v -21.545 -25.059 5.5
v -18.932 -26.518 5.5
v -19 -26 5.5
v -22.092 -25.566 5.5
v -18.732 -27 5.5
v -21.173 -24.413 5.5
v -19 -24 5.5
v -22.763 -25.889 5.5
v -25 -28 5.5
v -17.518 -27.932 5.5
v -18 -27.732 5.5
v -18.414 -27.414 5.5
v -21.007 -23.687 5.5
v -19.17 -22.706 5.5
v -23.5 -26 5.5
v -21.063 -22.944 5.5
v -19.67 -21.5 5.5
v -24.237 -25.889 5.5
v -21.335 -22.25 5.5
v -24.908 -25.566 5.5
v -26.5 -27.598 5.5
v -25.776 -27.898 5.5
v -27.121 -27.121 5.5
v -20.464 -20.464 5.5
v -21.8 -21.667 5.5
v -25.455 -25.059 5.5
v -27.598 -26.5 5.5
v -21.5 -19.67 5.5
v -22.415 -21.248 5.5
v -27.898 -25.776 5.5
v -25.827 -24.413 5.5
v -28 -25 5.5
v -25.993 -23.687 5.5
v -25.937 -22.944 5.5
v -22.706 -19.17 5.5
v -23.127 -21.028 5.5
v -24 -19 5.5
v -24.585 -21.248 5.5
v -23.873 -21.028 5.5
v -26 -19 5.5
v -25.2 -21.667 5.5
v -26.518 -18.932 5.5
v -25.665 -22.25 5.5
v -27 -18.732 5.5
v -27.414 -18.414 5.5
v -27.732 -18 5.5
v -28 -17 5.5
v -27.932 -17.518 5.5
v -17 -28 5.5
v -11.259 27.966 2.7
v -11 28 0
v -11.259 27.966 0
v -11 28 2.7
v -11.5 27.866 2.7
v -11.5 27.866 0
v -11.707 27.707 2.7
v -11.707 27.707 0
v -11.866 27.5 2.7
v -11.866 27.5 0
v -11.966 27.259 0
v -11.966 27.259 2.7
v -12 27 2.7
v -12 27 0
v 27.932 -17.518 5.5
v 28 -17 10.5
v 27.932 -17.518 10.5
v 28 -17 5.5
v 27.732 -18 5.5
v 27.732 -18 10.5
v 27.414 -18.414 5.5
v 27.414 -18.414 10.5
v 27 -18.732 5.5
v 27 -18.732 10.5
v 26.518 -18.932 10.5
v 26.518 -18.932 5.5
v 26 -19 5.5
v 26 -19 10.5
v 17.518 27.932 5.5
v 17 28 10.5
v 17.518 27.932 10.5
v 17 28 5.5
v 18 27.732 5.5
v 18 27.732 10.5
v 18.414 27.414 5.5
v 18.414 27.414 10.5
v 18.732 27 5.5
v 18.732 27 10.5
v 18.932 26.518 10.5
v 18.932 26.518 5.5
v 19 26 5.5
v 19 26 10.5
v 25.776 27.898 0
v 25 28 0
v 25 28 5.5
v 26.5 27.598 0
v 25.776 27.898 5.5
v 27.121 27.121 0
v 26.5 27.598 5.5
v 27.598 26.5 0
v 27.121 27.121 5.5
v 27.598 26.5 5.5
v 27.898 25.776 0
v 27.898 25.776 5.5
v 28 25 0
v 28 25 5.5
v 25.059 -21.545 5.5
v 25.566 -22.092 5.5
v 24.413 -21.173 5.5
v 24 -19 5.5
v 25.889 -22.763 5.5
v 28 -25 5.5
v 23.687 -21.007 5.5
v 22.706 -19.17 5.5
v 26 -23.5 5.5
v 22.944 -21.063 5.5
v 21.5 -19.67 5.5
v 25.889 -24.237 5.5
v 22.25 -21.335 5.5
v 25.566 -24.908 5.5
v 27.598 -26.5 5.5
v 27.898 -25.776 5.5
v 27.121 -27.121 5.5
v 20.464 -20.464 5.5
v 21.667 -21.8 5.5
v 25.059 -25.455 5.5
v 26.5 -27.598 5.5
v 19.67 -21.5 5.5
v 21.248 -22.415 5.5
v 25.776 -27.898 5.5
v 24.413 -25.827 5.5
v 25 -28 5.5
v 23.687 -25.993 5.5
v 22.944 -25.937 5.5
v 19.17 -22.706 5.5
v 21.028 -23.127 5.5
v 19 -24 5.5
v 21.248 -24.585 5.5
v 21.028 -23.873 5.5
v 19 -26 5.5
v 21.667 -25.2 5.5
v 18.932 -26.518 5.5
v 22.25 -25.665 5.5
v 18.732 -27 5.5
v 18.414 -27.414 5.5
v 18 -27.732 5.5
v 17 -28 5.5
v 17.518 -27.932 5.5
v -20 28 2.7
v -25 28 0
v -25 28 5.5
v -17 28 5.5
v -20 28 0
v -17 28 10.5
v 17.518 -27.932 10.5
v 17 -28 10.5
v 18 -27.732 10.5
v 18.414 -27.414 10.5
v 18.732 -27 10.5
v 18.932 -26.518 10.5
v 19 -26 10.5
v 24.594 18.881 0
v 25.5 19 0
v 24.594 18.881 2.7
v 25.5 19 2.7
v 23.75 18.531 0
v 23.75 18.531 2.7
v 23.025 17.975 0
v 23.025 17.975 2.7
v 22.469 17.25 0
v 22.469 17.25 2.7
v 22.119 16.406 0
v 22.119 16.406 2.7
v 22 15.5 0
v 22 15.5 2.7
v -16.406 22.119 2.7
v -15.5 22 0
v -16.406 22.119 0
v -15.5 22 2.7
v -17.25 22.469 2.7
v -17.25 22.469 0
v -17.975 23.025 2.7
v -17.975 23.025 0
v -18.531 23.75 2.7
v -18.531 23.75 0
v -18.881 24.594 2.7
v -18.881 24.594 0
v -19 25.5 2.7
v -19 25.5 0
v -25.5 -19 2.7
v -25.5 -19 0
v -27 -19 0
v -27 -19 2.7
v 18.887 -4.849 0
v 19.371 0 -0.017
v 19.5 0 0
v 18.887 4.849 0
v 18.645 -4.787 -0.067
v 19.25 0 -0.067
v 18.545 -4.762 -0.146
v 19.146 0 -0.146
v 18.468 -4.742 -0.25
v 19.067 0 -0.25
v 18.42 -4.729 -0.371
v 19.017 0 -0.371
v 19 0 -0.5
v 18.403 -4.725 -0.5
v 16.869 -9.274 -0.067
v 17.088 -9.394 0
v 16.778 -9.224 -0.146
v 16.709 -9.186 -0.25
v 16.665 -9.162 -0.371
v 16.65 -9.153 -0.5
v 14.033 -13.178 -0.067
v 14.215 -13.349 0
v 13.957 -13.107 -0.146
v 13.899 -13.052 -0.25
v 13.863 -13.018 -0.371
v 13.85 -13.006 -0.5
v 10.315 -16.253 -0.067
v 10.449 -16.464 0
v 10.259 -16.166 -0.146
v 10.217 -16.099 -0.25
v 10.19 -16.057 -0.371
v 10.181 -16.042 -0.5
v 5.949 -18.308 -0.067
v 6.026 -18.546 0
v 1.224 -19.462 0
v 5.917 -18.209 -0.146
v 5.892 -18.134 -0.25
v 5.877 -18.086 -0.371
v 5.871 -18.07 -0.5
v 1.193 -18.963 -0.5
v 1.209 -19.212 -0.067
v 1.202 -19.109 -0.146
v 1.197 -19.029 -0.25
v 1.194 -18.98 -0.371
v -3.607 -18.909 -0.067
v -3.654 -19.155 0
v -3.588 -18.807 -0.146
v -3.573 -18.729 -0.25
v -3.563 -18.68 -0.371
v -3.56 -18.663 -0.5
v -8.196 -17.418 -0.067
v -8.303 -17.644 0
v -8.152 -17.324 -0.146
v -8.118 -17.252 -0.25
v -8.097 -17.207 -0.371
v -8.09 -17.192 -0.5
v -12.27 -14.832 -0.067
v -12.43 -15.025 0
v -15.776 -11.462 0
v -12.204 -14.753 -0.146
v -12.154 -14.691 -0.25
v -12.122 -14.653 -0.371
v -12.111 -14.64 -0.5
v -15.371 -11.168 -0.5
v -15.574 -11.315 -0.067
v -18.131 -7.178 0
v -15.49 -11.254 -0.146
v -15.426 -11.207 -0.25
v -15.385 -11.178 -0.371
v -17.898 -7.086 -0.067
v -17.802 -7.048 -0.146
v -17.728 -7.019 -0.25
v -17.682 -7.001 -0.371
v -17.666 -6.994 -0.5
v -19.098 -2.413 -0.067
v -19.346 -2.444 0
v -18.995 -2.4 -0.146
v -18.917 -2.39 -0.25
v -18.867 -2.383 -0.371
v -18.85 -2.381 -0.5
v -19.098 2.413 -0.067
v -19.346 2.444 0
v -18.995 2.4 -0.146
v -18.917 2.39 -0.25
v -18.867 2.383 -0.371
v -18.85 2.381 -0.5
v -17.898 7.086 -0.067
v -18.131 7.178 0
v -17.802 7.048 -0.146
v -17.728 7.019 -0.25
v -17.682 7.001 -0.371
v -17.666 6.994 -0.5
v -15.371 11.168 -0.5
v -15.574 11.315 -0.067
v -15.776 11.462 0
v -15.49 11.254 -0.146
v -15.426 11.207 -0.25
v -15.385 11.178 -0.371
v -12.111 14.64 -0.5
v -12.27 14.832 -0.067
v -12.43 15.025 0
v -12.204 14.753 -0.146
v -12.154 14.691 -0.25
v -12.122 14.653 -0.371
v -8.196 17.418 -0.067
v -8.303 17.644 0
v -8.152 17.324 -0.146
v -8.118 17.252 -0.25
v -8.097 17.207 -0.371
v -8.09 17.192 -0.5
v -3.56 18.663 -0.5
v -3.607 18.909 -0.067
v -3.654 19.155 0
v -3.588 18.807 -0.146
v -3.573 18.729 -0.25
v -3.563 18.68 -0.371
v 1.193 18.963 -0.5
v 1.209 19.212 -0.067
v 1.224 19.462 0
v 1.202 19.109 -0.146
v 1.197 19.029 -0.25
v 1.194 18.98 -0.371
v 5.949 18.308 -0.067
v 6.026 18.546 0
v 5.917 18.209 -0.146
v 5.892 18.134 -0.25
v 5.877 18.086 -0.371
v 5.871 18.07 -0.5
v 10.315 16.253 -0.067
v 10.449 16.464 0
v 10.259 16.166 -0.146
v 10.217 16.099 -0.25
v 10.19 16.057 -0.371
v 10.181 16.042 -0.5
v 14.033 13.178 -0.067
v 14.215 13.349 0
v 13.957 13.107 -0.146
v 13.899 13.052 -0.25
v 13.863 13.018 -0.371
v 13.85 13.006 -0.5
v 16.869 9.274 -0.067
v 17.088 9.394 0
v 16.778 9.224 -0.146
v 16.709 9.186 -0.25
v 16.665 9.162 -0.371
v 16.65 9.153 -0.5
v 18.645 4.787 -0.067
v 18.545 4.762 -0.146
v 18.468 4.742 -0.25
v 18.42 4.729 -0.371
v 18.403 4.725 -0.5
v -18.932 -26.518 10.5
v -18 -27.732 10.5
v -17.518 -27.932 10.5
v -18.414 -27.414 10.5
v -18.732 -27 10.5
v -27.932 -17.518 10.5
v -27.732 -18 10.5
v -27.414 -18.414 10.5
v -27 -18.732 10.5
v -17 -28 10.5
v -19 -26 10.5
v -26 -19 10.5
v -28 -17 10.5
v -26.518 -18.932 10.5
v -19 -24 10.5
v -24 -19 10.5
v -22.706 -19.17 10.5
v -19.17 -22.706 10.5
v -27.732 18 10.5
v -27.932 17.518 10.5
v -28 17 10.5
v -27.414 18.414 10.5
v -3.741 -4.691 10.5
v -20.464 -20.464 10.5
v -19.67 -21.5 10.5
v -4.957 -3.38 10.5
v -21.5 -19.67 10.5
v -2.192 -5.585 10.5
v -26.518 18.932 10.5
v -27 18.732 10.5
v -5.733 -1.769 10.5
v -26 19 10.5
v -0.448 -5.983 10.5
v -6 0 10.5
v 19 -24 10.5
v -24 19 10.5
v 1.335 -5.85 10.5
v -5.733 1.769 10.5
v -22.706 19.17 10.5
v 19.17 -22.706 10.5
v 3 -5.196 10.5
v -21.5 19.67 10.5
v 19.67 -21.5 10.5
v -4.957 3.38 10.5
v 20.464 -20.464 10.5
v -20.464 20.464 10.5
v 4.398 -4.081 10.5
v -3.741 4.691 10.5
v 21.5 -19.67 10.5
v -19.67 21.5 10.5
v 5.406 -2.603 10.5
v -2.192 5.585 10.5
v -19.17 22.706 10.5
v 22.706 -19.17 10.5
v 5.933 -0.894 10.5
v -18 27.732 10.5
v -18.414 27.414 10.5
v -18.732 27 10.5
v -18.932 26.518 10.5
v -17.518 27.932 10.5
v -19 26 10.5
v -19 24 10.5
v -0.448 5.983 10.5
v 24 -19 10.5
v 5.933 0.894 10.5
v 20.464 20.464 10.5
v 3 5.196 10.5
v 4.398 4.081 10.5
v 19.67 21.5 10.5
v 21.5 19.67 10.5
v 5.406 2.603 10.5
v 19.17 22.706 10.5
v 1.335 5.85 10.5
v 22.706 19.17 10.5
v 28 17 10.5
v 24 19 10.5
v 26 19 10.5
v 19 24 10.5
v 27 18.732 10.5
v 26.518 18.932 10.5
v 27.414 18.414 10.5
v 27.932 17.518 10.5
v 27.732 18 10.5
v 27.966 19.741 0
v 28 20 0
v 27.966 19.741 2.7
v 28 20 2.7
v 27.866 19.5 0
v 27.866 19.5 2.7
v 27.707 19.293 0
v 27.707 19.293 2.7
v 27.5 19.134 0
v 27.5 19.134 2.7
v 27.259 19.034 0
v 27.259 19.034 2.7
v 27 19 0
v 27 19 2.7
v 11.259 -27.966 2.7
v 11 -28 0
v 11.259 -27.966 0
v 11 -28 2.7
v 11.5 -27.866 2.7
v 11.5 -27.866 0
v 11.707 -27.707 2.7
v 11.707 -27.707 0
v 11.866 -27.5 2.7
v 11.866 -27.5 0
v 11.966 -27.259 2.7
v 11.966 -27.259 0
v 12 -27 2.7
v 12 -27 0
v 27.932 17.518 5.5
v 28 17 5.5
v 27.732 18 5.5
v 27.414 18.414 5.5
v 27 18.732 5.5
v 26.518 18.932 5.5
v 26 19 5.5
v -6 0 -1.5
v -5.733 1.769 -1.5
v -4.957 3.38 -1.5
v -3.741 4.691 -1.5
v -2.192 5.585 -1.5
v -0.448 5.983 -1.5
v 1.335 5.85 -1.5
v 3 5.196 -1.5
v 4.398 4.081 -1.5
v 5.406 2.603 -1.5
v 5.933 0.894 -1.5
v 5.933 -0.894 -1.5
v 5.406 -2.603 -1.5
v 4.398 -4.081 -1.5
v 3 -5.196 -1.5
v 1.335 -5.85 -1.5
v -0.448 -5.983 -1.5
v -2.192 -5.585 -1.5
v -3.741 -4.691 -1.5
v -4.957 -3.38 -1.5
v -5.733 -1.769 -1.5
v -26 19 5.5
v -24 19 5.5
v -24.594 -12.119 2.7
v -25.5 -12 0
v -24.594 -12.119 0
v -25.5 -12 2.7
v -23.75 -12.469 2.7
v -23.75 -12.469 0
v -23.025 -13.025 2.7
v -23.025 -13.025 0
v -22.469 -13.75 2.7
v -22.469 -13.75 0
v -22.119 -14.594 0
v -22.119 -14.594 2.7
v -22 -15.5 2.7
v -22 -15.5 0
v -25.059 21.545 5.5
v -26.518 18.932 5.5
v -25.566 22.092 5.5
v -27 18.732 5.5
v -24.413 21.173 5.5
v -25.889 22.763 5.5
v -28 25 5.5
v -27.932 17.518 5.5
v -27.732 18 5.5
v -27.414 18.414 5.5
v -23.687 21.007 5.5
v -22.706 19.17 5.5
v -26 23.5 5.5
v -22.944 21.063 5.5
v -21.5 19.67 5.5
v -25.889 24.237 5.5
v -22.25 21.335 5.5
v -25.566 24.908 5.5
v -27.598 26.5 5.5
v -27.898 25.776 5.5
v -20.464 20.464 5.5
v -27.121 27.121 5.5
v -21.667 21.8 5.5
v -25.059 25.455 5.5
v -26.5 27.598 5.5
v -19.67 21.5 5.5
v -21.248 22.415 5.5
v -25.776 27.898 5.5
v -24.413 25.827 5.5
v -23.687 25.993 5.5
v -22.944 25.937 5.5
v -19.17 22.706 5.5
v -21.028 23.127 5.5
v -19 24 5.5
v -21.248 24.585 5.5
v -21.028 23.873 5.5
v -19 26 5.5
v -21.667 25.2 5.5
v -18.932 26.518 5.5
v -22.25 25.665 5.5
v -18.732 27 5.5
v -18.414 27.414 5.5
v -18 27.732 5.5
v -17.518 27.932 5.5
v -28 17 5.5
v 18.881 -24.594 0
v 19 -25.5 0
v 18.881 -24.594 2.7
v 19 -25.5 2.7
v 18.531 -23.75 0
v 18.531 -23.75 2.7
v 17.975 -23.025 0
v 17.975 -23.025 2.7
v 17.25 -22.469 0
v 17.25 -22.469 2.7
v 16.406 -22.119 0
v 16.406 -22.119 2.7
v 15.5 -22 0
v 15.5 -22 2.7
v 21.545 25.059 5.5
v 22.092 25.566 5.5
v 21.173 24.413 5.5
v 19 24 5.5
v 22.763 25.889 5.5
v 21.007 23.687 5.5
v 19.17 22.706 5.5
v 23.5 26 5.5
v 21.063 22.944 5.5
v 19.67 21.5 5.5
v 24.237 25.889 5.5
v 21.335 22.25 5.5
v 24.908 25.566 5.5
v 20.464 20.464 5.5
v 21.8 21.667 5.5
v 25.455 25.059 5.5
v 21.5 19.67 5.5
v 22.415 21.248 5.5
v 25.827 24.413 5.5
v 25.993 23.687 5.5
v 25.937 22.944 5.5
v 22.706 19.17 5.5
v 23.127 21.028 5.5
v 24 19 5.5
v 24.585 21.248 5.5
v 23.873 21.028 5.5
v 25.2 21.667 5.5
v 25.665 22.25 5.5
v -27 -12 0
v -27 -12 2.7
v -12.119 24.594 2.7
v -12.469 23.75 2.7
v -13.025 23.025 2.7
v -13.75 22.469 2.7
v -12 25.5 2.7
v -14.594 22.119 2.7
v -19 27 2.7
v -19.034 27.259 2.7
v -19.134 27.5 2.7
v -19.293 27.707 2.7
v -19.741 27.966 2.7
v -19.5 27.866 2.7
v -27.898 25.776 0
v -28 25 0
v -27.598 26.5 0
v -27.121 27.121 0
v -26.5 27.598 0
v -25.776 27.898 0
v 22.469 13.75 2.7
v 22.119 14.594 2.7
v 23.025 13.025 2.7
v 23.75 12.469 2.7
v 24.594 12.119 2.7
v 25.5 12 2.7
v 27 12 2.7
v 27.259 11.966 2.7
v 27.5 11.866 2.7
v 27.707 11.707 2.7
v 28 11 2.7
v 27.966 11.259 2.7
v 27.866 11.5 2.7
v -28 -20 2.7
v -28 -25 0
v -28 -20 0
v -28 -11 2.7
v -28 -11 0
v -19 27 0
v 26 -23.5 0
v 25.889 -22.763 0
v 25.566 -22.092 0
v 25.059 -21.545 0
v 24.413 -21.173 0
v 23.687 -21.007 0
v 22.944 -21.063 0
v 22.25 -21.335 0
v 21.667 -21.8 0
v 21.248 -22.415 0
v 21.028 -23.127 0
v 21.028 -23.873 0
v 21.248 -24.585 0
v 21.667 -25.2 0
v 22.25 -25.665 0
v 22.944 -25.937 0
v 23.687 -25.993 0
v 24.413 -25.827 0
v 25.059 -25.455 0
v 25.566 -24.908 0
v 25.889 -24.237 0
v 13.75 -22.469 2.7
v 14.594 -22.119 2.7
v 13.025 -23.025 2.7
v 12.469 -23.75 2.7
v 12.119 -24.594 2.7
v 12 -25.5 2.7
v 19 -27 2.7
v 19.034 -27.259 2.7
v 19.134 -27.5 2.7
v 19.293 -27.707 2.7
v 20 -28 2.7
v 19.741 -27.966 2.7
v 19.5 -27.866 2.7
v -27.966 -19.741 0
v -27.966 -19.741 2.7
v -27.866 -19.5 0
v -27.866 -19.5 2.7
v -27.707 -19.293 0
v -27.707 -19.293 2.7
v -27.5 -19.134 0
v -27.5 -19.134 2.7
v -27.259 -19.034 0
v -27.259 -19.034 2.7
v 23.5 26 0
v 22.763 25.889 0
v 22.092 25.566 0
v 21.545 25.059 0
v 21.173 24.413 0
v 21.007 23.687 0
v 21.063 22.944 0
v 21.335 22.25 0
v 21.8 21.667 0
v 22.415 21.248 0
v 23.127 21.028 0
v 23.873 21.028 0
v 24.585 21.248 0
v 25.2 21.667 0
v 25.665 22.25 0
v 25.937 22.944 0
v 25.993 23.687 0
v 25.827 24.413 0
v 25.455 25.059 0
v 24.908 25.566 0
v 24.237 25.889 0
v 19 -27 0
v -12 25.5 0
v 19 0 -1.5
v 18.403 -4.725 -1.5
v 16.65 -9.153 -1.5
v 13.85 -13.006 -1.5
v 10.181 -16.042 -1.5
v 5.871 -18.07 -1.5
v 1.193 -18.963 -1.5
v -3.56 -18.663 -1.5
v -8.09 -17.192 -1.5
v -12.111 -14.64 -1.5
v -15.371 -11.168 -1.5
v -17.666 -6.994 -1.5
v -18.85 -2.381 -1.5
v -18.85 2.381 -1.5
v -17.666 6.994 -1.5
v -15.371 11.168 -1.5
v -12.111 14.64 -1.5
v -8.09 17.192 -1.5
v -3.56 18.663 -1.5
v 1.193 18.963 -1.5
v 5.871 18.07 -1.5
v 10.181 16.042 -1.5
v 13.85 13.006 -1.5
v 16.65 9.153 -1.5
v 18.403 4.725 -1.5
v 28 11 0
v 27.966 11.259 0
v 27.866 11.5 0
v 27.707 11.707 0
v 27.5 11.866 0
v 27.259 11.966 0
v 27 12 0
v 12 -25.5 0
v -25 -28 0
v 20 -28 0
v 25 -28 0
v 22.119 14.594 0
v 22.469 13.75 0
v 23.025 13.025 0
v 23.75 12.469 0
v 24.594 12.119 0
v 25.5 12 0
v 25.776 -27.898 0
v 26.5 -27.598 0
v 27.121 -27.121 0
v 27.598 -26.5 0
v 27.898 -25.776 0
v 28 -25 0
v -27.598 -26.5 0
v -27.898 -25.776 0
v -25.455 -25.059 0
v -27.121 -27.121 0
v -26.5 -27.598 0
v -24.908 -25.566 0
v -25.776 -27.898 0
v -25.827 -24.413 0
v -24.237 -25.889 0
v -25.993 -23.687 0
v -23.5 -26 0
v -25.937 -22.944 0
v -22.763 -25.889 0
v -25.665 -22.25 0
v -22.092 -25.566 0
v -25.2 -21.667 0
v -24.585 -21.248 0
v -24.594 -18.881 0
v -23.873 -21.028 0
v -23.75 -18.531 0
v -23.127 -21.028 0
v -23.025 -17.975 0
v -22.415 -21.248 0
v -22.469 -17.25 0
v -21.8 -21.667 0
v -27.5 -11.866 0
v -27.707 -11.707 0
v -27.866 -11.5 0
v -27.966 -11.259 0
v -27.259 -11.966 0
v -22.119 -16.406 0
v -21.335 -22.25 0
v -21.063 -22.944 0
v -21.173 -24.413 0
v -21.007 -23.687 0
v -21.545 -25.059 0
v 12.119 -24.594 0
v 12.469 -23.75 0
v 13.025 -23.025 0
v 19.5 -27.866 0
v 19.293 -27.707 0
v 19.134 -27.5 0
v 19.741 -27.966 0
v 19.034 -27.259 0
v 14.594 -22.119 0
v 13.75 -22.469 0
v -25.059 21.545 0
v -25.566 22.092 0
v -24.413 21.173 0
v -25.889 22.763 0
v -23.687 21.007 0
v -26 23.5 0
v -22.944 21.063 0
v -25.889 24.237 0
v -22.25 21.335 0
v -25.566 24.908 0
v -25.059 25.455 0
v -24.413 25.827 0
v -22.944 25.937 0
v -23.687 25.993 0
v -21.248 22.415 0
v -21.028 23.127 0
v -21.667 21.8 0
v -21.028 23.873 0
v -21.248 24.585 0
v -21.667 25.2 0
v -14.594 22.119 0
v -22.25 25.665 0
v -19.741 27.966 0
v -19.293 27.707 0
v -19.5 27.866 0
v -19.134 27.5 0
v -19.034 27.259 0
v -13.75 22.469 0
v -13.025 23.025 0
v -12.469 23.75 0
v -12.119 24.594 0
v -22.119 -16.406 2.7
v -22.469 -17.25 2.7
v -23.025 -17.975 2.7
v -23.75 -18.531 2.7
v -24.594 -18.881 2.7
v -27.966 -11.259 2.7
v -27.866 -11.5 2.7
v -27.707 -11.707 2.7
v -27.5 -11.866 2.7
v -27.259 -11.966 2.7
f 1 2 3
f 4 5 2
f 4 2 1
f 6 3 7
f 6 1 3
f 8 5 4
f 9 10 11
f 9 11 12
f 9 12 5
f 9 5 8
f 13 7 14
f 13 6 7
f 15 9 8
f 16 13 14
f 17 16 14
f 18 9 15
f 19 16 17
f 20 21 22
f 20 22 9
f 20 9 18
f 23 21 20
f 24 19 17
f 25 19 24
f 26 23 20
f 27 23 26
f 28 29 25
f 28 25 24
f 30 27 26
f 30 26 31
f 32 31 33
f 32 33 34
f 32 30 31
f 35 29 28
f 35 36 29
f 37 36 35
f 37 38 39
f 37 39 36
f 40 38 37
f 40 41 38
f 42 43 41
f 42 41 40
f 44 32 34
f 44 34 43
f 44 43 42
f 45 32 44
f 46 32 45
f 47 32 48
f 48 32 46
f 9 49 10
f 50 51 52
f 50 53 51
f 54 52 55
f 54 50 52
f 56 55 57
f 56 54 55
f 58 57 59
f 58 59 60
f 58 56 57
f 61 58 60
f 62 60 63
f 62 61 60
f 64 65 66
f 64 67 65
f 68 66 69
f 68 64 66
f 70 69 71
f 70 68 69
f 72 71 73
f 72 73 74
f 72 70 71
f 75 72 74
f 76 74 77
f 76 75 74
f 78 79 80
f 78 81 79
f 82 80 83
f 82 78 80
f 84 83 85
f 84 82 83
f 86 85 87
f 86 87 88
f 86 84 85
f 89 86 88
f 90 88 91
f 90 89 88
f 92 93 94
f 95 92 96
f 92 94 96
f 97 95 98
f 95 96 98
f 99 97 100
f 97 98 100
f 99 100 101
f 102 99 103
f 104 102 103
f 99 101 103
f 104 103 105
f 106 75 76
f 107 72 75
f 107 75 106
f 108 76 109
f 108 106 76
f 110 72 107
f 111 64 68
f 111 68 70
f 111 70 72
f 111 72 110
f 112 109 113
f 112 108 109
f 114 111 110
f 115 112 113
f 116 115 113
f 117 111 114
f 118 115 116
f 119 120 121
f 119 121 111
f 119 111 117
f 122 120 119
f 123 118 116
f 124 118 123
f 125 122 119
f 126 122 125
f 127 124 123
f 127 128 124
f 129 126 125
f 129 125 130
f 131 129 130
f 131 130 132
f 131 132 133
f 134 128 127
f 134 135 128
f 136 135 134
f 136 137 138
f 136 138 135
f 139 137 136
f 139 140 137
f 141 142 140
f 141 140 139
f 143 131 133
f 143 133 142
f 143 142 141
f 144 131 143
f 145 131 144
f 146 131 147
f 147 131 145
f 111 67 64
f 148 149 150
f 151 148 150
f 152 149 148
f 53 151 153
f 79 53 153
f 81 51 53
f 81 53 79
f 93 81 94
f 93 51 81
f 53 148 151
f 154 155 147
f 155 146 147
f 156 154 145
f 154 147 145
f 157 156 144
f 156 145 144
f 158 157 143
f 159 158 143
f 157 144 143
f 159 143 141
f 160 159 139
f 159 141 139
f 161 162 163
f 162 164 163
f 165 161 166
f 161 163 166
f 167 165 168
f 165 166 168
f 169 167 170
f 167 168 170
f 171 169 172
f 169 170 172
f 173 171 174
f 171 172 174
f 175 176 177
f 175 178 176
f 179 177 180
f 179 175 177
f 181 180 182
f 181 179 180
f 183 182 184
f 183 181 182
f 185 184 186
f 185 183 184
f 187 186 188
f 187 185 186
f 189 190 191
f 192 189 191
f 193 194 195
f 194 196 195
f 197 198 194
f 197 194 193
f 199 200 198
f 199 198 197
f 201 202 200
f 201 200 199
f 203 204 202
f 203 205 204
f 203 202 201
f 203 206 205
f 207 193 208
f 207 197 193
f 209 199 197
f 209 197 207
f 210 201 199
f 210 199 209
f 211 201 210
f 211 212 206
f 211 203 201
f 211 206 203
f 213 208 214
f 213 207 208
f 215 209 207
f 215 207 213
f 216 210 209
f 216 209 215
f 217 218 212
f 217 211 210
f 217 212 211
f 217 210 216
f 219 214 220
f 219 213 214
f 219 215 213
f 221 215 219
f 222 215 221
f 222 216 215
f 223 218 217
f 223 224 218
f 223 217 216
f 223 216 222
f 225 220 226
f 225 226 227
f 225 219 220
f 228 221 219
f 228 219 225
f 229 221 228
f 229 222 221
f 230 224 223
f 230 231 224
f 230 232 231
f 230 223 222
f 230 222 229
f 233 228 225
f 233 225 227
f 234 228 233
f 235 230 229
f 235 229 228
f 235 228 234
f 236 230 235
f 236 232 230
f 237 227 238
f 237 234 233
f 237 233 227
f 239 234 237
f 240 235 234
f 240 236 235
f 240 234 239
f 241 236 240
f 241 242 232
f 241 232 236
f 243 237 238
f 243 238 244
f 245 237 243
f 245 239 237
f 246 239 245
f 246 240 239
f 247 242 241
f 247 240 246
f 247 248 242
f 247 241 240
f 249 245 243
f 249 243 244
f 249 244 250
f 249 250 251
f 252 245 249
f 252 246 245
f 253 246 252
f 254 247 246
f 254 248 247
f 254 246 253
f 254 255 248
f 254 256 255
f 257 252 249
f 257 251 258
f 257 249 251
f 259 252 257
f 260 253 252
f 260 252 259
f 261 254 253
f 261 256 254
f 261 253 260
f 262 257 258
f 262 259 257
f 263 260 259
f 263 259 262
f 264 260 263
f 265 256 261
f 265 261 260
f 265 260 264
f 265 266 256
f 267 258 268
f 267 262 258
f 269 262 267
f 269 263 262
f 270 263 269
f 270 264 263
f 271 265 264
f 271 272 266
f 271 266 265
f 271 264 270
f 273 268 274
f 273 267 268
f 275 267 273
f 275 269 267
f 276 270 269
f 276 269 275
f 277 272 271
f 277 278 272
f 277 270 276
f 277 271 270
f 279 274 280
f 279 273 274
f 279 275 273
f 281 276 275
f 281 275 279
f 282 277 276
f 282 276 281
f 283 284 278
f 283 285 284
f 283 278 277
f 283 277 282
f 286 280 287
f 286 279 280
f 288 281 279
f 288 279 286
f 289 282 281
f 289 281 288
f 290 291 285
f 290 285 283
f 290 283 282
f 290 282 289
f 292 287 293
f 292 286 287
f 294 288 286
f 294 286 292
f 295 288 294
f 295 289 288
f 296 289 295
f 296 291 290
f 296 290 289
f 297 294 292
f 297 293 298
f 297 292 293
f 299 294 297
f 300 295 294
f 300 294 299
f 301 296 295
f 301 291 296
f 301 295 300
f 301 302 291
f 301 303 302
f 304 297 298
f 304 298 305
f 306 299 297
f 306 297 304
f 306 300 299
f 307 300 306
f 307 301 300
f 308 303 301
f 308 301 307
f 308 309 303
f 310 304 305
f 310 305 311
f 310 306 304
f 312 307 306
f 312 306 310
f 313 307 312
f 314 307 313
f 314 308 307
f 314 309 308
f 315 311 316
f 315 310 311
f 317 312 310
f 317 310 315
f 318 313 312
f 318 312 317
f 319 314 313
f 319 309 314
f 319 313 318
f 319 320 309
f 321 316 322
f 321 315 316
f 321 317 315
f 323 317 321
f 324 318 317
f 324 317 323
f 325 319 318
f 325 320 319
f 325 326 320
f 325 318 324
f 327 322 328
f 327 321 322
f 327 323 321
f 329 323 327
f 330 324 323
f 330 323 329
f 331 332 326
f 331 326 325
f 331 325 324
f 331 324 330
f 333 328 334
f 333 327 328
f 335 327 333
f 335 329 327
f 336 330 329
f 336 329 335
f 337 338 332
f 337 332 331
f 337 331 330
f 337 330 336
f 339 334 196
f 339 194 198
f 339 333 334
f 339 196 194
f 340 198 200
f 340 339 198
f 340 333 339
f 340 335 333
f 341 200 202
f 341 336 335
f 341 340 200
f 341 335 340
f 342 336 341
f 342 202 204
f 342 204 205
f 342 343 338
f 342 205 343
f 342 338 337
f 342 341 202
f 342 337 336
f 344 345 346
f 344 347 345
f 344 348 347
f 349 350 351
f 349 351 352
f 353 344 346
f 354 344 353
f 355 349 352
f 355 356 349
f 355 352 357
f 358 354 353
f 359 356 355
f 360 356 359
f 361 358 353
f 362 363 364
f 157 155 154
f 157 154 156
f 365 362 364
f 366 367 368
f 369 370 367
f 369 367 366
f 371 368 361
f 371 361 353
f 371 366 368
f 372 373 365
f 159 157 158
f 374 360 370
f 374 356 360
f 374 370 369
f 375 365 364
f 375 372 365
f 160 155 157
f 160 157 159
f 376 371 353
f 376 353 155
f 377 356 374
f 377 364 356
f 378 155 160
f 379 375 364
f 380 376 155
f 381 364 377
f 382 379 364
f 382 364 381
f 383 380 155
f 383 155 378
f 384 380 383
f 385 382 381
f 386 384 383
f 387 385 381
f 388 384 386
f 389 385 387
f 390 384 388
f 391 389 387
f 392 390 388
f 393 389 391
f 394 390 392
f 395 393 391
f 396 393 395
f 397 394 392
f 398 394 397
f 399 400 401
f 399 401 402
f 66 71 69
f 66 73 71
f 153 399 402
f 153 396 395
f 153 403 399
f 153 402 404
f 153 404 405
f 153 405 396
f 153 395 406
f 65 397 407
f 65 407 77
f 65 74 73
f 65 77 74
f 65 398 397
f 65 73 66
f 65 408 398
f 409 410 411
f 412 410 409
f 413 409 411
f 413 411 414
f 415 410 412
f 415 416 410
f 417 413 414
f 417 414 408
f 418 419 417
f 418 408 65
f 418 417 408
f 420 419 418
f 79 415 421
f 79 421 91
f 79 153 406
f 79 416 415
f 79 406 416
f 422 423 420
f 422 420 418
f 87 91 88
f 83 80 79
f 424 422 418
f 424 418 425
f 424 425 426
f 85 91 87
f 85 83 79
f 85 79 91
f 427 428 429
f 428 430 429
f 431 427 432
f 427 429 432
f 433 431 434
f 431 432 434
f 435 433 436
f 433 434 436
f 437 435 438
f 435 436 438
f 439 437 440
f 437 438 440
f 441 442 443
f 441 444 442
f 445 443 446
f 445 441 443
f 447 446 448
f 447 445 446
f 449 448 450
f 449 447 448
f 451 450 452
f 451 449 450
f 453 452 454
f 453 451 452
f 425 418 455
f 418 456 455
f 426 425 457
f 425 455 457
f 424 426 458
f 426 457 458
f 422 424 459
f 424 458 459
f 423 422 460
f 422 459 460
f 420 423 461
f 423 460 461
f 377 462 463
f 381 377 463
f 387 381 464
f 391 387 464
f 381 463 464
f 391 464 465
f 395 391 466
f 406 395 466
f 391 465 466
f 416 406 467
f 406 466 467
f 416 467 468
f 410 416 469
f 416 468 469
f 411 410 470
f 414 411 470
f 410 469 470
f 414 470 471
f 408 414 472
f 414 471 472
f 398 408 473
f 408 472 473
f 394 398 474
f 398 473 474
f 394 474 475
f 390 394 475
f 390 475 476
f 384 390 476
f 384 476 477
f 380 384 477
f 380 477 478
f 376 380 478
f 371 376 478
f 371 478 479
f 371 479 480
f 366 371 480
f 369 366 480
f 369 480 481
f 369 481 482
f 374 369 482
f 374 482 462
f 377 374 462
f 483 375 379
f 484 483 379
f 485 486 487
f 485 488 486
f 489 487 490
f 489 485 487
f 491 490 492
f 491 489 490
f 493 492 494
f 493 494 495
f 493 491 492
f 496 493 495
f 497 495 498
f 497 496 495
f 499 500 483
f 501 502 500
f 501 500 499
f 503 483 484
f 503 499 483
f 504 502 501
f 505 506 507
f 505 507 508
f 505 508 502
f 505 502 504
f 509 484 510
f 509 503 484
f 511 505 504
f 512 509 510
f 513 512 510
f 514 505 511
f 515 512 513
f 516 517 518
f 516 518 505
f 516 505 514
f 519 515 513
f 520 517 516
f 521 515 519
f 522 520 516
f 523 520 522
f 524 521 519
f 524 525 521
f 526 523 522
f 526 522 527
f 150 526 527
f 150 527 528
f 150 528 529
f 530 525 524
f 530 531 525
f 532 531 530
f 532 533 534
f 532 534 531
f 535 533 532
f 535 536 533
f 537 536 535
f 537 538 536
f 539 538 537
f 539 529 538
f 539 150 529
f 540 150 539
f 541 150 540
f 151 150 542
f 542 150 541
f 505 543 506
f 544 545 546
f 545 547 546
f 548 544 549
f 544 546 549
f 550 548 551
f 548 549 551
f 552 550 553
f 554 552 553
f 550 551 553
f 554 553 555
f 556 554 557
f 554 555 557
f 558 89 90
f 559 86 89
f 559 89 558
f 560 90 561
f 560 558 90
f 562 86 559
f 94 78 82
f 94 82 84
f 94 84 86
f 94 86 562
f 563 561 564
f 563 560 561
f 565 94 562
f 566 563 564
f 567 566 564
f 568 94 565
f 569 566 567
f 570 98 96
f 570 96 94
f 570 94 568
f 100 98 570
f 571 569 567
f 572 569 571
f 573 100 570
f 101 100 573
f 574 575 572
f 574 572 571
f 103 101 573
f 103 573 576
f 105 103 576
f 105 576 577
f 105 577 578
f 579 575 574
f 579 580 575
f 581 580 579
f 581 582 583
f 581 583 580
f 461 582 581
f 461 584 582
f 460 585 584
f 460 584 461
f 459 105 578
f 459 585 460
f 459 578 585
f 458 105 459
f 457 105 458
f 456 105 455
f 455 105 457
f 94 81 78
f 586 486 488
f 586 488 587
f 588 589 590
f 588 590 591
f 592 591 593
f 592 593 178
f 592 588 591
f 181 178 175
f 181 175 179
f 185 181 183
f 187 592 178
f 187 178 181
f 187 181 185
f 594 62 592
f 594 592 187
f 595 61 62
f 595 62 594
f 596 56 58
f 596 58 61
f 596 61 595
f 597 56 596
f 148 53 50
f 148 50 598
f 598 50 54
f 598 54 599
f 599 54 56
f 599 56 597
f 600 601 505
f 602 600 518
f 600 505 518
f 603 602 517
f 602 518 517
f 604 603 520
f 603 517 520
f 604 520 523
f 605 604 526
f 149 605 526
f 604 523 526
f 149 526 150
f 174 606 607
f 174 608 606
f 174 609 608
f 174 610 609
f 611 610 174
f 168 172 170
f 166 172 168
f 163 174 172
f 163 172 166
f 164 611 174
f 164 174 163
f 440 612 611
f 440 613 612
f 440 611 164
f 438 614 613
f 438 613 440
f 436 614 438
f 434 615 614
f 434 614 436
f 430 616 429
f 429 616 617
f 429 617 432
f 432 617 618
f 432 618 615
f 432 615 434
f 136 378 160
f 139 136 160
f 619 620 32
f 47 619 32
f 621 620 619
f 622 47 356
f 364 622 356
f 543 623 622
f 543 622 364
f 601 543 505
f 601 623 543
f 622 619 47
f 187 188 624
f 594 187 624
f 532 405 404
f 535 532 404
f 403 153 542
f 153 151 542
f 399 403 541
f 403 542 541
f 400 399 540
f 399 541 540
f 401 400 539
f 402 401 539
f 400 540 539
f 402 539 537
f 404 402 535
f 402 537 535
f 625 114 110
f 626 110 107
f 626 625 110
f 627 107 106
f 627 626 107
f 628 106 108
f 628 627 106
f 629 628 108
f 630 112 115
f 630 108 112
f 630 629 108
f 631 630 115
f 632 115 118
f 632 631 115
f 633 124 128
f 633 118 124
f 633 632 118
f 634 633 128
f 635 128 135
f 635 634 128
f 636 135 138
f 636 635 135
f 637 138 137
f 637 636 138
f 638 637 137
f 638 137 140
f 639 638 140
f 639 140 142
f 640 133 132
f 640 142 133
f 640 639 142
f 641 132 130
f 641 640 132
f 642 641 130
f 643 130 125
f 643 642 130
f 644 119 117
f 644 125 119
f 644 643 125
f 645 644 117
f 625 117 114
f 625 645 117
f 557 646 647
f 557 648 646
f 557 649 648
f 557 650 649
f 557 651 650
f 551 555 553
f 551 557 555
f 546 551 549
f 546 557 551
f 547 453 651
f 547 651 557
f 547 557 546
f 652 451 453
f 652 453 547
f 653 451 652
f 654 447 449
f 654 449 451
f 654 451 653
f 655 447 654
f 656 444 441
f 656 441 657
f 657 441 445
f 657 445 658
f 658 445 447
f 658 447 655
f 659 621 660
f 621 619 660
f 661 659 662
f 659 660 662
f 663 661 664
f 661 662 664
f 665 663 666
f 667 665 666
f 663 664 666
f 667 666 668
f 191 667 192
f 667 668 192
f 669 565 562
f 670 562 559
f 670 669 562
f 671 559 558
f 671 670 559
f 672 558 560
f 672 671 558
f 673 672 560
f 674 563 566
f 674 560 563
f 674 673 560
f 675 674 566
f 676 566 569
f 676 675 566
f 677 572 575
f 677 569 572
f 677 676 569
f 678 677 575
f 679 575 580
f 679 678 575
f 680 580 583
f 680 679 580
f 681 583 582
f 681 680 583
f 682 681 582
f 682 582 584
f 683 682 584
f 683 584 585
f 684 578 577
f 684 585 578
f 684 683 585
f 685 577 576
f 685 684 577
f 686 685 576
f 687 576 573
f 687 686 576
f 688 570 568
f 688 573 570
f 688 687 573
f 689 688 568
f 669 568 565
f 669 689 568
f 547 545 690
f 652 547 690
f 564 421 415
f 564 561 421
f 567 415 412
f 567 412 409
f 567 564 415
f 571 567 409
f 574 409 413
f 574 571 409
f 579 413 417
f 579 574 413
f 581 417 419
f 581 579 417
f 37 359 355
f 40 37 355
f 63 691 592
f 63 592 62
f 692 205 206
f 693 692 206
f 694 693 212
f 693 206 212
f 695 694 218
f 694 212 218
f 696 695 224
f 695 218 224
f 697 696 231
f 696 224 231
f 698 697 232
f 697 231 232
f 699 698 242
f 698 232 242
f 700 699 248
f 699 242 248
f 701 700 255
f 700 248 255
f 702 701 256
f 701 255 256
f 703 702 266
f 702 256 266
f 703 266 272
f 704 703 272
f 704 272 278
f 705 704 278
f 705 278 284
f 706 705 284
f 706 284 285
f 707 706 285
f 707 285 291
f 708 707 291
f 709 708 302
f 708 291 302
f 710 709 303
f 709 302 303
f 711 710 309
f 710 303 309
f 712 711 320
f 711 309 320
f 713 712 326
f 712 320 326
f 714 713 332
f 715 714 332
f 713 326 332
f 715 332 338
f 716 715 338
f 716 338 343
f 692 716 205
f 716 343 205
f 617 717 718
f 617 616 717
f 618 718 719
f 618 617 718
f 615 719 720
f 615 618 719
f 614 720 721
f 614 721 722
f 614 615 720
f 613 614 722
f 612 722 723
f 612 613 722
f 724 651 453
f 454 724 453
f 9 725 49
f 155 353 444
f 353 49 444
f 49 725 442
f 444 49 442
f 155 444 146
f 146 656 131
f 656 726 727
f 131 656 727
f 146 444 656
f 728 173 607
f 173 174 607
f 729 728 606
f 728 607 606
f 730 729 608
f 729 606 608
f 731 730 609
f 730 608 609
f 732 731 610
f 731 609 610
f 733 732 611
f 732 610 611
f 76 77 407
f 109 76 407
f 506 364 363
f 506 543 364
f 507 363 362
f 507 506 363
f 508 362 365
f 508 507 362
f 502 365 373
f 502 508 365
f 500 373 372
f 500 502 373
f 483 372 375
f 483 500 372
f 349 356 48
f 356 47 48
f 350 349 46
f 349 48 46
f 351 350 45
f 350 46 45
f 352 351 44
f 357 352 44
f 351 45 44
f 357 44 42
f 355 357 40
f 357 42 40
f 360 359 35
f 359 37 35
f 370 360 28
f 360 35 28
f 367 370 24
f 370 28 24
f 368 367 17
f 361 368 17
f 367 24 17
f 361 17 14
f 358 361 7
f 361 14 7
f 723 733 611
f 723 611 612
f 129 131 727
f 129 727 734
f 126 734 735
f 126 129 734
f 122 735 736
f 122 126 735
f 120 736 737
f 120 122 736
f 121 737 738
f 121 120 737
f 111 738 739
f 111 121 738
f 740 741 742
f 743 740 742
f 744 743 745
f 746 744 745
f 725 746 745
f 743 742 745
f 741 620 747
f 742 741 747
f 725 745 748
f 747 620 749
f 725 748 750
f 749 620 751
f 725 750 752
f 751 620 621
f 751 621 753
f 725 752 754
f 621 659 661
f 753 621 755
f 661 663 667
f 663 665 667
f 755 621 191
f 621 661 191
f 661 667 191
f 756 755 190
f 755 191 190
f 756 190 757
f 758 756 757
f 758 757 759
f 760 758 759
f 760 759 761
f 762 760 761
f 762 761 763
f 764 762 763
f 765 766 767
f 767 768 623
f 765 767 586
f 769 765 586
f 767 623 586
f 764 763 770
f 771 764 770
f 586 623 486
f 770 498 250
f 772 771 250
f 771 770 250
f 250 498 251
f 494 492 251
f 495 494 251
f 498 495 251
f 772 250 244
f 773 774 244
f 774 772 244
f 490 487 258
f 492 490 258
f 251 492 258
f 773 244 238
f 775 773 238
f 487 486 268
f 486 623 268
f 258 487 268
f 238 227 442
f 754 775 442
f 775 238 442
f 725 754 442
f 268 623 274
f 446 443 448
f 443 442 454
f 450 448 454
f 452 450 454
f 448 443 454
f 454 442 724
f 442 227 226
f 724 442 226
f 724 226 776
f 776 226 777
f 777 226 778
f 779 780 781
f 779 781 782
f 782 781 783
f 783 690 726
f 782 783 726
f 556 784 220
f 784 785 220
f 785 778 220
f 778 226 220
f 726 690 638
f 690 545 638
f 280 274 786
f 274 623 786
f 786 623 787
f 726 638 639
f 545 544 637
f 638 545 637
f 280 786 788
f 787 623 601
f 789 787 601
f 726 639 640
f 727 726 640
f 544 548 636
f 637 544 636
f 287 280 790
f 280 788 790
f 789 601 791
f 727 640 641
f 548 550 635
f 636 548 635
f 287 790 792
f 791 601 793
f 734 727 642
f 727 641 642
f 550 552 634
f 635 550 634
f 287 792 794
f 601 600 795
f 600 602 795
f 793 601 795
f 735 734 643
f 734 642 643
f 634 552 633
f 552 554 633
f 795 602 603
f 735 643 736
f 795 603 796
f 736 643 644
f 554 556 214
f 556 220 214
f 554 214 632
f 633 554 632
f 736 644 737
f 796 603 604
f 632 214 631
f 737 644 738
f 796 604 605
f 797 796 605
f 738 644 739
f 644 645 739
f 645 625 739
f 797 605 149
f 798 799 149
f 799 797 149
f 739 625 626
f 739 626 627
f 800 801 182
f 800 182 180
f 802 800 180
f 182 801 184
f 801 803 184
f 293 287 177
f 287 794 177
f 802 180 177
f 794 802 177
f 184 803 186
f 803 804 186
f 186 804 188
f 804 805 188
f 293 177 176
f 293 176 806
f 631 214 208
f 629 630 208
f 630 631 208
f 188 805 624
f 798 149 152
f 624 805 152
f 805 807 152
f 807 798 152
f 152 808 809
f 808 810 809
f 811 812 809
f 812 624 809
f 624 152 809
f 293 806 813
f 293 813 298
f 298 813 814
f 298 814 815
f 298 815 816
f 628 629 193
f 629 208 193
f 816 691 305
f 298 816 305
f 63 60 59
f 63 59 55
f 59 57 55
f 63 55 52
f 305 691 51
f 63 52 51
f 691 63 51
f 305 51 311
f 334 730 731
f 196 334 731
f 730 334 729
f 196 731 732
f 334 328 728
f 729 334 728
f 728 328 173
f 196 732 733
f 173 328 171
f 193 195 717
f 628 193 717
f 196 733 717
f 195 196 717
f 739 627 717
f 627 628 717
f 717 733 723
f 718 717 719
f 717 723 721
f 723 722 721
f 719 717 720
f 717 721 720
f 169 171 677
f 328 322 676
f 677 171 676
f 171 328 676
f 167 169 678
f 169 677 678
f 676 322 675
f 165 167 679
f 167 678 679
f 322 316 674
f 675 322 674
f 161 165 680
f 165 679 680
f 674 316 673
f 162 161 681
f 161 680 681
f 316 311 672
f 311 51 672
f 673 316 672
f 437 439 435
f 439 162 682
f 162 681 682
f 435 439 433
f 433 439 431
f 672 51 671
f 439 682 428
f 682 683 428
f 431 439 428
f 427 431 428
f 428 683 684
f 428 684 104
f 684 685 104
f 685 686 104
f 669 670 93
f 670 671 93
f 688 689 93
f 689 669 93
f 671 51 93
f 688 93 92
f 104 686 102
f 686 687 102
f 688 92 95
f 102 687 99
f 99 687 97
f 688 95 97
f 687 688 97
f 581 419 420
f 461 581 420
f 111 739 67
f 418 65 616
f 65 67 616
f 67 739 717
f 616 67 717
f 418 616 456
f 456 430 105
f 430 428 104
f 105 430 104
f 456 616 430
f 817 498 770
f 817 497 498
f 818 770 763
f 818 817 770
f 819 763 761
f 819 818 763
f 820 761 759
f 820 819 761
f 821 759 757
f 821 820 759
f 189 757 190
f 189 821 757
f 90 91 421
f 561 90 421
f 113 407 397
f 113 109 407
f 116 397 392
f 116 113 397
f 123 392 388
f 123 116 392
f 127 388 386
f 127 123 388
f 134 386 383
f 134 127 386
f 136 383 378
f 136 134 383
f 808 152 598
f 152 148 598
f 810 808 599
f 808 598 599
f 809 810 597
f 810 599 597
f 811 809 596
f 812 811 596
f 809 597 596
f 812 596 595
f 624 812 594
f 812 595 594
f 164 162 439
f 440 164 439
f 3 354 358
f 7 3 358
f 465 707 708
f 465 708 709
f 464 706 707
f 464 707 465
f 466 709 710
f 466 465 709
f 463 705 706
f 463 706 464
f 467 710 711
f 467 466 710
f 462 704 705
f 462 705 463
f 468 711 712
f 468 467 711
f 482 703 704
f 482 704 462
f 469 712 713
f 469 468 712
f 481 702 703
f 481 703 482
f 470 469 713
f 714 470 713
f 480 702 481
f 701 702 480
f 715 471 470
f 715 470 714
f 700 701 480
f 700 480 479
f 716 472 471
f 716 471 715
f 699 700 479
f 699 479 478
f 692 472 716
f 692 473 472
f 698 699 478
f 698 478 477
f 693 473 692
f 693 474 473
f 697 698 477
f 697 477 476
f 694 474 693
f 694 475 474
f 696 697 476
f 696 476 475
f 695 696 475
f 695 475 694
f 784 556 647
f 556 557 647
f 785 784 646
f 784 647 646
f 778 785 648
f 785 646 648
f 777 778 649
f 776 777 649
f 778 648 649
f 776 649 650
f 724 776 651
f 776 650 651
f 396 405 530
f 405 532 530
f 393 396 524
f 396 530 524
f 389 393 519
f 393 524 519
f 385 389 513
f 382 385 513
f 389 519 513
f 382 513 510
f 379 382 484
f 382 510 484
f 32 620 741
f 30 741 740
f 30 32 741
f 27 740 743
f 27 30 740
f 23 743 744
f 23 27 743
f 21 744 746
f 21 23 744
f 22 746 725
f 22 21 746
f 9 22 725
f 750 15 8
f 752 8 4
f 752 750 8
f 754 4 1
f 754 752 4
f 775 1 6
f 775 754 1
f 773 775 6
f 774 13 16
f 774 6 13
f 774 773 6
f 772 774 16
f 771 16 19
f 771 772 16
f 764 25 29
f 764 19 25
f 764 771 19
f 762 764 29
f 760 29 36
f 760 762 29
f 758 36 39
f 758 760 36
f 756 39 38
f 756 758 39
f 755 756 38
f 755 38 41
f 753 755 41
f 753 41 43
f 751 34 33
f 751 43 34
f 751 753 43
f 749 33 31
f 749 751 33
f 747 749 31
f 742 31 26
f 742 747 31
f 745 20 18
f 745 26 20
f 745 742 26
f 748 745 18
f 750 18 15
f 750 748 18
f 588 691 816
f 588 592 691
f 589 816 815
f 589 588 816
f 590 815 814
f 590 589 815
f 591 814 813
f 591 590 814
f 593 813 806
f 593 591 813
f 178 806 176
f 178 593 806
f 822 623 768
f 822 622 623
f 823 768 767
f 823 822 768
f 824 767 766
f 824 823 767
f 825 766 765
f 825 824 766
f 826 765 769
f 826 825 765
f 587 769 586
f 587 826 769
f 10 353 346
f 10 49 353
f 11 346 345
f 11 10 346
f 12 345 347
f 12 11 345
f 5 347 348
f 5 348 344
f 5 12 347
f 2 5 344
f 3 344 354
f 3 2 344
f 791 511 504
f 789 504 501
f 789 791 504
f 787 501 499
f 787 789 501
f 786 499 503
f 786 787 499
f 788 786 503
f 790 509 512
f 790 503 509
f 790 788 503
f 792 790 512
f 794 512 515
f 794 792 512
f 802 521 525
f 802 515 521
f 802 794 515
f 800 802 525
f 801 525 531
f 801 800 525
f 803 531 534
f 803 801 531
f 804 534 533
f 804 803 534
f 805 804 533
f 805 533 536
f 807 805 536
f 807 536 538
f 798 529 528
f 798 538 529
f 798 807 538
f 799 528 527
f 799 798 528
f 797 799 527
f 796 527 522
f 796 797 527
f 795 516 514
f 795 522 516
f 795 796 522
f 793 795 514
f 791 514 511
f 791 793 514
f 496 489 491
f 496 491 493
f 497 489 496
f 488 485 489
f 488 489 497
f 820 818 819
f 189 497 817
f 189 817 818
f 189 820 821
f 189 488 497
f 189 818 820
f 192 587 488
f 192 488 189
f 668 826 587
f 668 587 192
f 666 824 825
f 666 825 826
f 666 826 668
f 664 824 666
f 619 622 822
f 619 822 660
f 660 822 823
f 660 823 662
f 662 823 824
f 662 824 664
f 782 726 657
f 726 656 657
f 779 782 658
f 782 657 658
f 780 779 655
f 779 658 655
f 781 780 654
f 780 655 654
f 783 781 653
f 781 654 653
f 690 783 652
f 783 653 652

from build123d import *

# Parameters (mm, degrees)
SKETCH1_W           = 56
SKETCH1_H           = 56
BOSS_EXTRUDE1_DEPTH = 10.5
SKETCH4_R           = 19
BOSS_EXTRUDE4_DEPTH = 1.5
FILLET1_R           = 0.5
FILLET2_R           = 3
SKETCH5_R           = 6
CUT_EXTRUDE1_DEPTH  = 42.376321731
SKETCH8_W           = 7
SKETCH8_H           = 6
CUT_EXTRUDE2_DEPTH  = 2.7
CIRPATTERN7_COUNT   = 4
FILLET5_R           = 1
FILLET6_R           = 3.5
SKETCH10_W          = 9
SKETCH10_H          = 9
CUT_EXTRUDE4_DEPTH  = 5
CIRPATTERN11_COUNT  = 4
FILLET8_R           = 2
FILLET9_R           = 5
CIRPATTERN12_COUNT  = 4


with BuildPart() as part:
    # Sketch1 → Boss-Extrude1 (new body)
    with BuildSketch(Plane.XY):
        Rectangle(SKETCH1_W, SKETCH1_H)
    extrude(amount=BOSS_EXTRUDE1_DEPTH)

    # Sketch4 → Boss-Extrude4 (add)
    with BuildSketch(Plane(origin=(0, 0, 0), x_dir=(-1, 0, 0), z_dir=(0, 0, -1))):
        with Locations(Location((0, 0, 0), (0, 0, 180))):
            Circle(SKETCH4_R)
    extrude(amount=BOSS_EXTRUDE4_DEPTH)

    # Fillet1
    fillet1_edges = [part.edges().sort_by_distance(p)[0] for p in [
        (-19, 0, 0),
    ]]
    fillet(fillet1_edges, radius=FILLET1_R)

    # Fillet2
    fillet2_edges = [part.edges().sort_by_distance(p)[0] for p in [
        (-28, 28, 5.25),
        (28, 28, 5.25),
        (28, -28, 5.25),
        (-28, -28, 5.25),
    ]]
    fillet(fillet2_edges, radius=FILLET2_R)

    # Sketch5 → Cut-Extrude1 (cut, through all)
    with BuildSketch(Plane(origin=(0, 0, -1.5), x_dir=(-1, 0, 0), z_dir=(0, 0, -1))):
        Circle(SKETCH5_R)
    extrude(amount=-CUT_EXTRUDE1_DEPTH, mode=Mode.SUBTRACT)

    # Sketch7 → Ø5.0mm Dowel Hole1 (revolve, cut)
    with BuildSketch(Plane(origin=(23.5, 23.5, 0), x_dir=(0, 1, 0), z_dir=(1, 0, 0))):
        Polygon((0, 0), (0, 18.502151548), (2.5, 17), (2.5, 0), align=None)
    f_5_0mm_dowel_hole1 = revolve(axis=Axis((23.5, 23.5, -6.35), (0, 0, 1)), mode=Mode.SUBTRACT)

    # Sketch8 → Cut-Extrude2 (cut)
    with BuildSketch(Plane(origin=(0, 0, 0), x_dir=(-1, 0, 0), z_dir=(0, 0, -1))):
        with Locations((15.5, 25)):
            Rectangle(SKETCH8_W, SKETCH8_H)
    cut_extrude2 = extrude(amount=-CUT_EXTRUDE2_DEPTH, mode=Mode.SUBTRACT)

    # CirPattern7: Cut-Extrude2 ×4 about axis
    cirpattern7_axis = Axis((0, 0, 0), (0, 0, 1))
    for i in range(1, CIRPATTERN7_COUNT):
        add(cut_extrude2.rotate(cirpattern7_axis, i * 360 / CIRPATTERN7_COUNT), mode=Mode.SUBTRACT)

    # Fillet5
    fillet5_edges = [part.edges().sort_by_distance(p)[0] for p in [
        (-28, -12, 1.35),
        (-28, -19, 1.35),
        (-12, 28, 1.35),
        (-19, 28, 1.35),
        (28, 12, 1.35),
        (28, 19, 1.35),
        (12, -28, 1.35),
        (19, -28, 1.35),
    ]]
    fillet(fillet5_edges, radius=FILLET5_R)

    # Fillet6
    fillet6_edges = [part.edges().sort_by_distance(p)[0] for p in [
        (-12, 22, 1.35),
        (-19, 22, 1.35),
        (22, 12, 1.35),
        (22, 19, 1.35),
        (12, -22, 1.35),
        (19, -22, 1.35),
        (-22, -19, 1.35),
        (-22, -12, 1.35),
    ]]
    fillet(fillet6_edges, radius=FILLET6_R - 0.0001)  # a hair under: the kernel refuses the full size

    # Sketch10 → Cut-Extrude4 (cut)
    with BuildSketch(Plane.XY.offset(10.5)):
        with Locations((-23.5, 23.5)):
            Rectangle(SKETCH10_W, SKETCH10_H)
    cut_extrude4 = extrude(amount=-CUT_EXTRUDE4_DEPTH, mode=Mode.SUBTRACT)

    # CirPattern11: Cut-Extrude4 ×4 about axis
    cirpattern11_axis = Axis((0, 0, 0), (0, 0, 1))
    for i in range(1, CIRPATTERN11_COUNT):
        add(cut_extrude4.rotate(cirpattern11_axis, i * 360 / CIRPATTERN11_COUNT), mode=Mode.SUBTRACT)

    # Fillet8
    fillet8_edges = [part.edges().sort_by_distance(p)[0] for p in [
        (-28, 19, 8),
        (-19, 28, 8),
        (19, 28, 8),
        (28, 19, 8),
        (28, -19, 8),
        (19, -28, 8),
        (-19, -28, 8),
        (-28, -19, 8),
    ]]
    fillet(fillet8_edges, radius=FILLET8_R)

    # Fillet9
    fillet9_edges = [part.edges().sort_by_distance(p)[0] for p in [
        (-19, 19, 8),
        (19, 19, 8),
        (19, -19, 8),
        (-19, -19, 8),
    ]]
    fillet(fillet9_edges, radius=FILLET9_R)

    # CirPattern12: Ø5.0mm Dowel Hole1 ×4 about axis
    cirpattern12_axis = Axis((0, 0, 0), (0, 0, 1))
    for i in range(1, CIRPATTERN12_COUNT):
        add(f_5_0mm_dowel_hole1.rotate(cirpattern12_axis, i * 360 / CIRPATTERN12_COUNT), mode=Mode.SUBTRACT)


solid = part.part
